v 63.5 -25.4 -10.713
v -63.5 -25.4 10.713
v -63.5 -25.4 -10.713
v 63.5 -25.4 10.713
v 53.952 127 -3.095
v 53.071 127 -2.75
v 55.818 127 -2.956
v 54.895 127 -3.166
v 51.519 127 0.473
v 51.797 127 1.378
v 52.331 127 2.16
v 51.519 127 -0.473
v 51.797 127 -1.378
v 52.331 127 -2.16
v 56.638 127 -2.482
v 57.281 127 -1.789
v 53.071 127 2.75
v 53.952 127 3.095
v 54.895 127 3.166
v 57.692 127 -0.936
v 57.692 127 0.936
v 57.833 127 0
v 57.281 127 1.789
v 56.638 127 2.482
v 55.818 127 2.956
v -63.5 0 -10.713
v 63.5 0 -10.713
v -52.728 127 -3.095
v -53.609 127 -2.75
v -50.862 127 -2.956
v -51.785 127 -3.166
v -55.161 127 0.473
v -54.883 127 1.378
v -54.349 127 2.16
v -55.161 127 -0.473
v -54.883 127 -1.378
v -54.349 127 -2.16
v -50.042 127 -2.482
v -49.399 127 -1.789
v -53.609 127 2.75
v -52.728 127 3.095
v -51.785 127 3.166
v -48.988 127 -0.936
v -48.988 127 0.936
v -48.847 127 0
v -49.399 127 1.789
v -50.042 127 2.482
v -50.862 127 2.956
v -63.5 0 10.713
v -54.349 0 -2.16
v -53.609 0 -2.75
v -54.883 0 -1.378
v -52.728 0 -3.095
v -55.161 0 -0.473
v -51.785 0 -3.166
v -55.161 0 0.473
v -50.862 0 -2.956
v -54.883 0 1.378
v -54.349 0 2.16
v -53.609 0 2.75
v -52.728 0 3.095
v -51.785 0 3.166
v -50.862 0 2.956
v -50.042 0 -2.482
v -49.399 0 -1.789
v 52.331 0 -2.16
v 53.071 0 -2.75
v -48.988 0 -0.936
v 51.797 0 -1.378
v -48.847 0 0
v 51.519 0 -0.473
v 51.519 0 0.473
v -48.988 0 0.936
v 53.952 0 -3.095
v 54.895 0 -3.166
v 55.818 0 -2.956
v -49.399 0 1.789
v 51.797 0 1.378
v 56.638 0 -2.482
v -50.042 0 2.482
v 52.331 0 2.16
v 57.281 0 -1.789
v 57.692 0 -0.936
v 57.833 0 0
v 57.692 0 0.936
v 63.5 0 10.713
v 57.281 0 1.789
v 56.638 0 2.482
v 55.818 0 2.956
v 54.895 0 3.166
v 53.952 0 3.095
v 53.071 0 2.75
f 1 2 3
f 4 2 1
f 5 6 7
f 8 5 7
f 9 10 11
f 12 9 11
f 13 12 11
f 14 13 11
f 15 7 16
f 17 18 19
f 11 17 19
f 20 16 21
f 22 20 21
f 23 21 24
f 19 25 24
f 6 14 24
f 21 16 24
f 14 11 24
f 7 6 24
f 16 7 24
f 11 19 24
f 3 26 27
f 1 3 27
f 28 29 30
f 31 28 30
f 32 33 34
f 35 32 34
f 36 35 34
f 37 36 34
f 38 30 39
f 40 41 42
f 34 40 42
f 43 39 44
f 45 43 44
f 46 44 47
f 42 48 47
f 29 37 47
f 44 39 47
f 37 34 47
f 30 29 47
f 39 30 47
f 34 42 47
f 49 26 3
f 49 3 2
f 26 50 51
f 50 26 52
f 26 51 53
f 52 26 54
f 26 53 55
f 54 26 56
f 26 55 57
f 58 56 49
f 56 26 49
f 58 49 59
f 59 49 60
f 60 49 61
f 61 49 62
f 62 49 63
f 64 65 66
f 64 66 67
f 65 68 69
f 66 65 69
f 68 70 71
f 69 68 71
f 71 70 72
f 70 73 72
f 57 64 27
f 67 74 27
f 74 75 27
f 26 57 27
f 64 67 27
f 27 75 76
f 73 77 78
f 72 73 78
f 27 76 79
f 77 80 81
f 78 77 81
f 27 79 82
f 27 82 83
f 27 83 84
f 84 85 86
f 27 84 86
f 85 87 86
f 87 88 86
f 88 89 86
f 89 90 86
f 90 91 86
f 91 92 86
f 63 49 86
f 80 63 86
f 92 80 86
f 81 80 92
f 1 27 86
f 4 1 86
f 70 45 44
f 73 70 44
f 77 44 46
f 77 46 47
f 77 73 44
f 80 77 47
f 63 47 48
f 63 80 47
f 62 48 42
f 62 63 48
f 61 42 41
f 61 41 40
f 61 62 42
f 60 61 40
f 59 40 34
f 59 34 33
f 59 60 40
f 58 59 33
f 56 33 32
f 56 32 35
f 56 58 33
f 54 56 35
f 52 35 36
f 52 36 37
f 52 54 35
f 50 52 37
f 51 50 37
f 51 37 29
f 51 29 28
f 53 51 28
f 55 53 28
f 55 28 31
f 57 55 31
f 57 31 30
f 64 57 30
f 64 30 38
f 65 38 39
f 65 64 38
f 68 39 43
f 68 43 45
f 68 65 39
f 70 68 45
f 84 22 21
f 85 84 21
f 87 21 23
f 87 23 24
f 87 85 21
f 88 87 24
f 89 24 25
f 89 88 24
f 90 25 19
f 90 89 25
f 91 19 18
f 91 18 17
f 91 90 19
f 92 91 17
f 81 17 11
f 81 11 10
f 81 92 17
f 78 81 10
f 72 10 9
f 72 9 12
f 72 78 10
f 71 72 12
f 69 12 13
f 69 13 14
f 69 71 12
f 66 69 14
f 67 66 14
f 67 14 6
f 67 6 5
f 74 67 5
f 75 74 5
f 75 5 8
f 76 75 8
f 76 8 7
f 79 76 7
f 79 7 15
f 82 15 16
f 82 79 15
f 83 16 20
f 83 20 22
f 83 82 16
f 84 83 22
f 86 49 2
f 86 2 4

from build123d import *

# Parameters (mm, degrees)
F0_W     = 127
F0_H     = 21.425162
F1_DEPTH = 25.4
F2_R     = 3.175
F3_DEPTH = 127


with BuildPart() as f1:
    # F0 (on Front) → F1 (new body)
    with BuildSketch(Plane.XZ):
        Rectangle(F0_W, F0_H)
    extrude(amount=F1_DEPTH)

    # F2 (on face) → F3 (join)
    with BuildSketch(Plane.XZ):
        with Locations((54.658038, 0)):
            Circle(F2_R)
        with Locations((-52.021962, 0)):
            Circle(F2_R)
    extrude(amount=-F3_DEPTH)


solid = f1.part
